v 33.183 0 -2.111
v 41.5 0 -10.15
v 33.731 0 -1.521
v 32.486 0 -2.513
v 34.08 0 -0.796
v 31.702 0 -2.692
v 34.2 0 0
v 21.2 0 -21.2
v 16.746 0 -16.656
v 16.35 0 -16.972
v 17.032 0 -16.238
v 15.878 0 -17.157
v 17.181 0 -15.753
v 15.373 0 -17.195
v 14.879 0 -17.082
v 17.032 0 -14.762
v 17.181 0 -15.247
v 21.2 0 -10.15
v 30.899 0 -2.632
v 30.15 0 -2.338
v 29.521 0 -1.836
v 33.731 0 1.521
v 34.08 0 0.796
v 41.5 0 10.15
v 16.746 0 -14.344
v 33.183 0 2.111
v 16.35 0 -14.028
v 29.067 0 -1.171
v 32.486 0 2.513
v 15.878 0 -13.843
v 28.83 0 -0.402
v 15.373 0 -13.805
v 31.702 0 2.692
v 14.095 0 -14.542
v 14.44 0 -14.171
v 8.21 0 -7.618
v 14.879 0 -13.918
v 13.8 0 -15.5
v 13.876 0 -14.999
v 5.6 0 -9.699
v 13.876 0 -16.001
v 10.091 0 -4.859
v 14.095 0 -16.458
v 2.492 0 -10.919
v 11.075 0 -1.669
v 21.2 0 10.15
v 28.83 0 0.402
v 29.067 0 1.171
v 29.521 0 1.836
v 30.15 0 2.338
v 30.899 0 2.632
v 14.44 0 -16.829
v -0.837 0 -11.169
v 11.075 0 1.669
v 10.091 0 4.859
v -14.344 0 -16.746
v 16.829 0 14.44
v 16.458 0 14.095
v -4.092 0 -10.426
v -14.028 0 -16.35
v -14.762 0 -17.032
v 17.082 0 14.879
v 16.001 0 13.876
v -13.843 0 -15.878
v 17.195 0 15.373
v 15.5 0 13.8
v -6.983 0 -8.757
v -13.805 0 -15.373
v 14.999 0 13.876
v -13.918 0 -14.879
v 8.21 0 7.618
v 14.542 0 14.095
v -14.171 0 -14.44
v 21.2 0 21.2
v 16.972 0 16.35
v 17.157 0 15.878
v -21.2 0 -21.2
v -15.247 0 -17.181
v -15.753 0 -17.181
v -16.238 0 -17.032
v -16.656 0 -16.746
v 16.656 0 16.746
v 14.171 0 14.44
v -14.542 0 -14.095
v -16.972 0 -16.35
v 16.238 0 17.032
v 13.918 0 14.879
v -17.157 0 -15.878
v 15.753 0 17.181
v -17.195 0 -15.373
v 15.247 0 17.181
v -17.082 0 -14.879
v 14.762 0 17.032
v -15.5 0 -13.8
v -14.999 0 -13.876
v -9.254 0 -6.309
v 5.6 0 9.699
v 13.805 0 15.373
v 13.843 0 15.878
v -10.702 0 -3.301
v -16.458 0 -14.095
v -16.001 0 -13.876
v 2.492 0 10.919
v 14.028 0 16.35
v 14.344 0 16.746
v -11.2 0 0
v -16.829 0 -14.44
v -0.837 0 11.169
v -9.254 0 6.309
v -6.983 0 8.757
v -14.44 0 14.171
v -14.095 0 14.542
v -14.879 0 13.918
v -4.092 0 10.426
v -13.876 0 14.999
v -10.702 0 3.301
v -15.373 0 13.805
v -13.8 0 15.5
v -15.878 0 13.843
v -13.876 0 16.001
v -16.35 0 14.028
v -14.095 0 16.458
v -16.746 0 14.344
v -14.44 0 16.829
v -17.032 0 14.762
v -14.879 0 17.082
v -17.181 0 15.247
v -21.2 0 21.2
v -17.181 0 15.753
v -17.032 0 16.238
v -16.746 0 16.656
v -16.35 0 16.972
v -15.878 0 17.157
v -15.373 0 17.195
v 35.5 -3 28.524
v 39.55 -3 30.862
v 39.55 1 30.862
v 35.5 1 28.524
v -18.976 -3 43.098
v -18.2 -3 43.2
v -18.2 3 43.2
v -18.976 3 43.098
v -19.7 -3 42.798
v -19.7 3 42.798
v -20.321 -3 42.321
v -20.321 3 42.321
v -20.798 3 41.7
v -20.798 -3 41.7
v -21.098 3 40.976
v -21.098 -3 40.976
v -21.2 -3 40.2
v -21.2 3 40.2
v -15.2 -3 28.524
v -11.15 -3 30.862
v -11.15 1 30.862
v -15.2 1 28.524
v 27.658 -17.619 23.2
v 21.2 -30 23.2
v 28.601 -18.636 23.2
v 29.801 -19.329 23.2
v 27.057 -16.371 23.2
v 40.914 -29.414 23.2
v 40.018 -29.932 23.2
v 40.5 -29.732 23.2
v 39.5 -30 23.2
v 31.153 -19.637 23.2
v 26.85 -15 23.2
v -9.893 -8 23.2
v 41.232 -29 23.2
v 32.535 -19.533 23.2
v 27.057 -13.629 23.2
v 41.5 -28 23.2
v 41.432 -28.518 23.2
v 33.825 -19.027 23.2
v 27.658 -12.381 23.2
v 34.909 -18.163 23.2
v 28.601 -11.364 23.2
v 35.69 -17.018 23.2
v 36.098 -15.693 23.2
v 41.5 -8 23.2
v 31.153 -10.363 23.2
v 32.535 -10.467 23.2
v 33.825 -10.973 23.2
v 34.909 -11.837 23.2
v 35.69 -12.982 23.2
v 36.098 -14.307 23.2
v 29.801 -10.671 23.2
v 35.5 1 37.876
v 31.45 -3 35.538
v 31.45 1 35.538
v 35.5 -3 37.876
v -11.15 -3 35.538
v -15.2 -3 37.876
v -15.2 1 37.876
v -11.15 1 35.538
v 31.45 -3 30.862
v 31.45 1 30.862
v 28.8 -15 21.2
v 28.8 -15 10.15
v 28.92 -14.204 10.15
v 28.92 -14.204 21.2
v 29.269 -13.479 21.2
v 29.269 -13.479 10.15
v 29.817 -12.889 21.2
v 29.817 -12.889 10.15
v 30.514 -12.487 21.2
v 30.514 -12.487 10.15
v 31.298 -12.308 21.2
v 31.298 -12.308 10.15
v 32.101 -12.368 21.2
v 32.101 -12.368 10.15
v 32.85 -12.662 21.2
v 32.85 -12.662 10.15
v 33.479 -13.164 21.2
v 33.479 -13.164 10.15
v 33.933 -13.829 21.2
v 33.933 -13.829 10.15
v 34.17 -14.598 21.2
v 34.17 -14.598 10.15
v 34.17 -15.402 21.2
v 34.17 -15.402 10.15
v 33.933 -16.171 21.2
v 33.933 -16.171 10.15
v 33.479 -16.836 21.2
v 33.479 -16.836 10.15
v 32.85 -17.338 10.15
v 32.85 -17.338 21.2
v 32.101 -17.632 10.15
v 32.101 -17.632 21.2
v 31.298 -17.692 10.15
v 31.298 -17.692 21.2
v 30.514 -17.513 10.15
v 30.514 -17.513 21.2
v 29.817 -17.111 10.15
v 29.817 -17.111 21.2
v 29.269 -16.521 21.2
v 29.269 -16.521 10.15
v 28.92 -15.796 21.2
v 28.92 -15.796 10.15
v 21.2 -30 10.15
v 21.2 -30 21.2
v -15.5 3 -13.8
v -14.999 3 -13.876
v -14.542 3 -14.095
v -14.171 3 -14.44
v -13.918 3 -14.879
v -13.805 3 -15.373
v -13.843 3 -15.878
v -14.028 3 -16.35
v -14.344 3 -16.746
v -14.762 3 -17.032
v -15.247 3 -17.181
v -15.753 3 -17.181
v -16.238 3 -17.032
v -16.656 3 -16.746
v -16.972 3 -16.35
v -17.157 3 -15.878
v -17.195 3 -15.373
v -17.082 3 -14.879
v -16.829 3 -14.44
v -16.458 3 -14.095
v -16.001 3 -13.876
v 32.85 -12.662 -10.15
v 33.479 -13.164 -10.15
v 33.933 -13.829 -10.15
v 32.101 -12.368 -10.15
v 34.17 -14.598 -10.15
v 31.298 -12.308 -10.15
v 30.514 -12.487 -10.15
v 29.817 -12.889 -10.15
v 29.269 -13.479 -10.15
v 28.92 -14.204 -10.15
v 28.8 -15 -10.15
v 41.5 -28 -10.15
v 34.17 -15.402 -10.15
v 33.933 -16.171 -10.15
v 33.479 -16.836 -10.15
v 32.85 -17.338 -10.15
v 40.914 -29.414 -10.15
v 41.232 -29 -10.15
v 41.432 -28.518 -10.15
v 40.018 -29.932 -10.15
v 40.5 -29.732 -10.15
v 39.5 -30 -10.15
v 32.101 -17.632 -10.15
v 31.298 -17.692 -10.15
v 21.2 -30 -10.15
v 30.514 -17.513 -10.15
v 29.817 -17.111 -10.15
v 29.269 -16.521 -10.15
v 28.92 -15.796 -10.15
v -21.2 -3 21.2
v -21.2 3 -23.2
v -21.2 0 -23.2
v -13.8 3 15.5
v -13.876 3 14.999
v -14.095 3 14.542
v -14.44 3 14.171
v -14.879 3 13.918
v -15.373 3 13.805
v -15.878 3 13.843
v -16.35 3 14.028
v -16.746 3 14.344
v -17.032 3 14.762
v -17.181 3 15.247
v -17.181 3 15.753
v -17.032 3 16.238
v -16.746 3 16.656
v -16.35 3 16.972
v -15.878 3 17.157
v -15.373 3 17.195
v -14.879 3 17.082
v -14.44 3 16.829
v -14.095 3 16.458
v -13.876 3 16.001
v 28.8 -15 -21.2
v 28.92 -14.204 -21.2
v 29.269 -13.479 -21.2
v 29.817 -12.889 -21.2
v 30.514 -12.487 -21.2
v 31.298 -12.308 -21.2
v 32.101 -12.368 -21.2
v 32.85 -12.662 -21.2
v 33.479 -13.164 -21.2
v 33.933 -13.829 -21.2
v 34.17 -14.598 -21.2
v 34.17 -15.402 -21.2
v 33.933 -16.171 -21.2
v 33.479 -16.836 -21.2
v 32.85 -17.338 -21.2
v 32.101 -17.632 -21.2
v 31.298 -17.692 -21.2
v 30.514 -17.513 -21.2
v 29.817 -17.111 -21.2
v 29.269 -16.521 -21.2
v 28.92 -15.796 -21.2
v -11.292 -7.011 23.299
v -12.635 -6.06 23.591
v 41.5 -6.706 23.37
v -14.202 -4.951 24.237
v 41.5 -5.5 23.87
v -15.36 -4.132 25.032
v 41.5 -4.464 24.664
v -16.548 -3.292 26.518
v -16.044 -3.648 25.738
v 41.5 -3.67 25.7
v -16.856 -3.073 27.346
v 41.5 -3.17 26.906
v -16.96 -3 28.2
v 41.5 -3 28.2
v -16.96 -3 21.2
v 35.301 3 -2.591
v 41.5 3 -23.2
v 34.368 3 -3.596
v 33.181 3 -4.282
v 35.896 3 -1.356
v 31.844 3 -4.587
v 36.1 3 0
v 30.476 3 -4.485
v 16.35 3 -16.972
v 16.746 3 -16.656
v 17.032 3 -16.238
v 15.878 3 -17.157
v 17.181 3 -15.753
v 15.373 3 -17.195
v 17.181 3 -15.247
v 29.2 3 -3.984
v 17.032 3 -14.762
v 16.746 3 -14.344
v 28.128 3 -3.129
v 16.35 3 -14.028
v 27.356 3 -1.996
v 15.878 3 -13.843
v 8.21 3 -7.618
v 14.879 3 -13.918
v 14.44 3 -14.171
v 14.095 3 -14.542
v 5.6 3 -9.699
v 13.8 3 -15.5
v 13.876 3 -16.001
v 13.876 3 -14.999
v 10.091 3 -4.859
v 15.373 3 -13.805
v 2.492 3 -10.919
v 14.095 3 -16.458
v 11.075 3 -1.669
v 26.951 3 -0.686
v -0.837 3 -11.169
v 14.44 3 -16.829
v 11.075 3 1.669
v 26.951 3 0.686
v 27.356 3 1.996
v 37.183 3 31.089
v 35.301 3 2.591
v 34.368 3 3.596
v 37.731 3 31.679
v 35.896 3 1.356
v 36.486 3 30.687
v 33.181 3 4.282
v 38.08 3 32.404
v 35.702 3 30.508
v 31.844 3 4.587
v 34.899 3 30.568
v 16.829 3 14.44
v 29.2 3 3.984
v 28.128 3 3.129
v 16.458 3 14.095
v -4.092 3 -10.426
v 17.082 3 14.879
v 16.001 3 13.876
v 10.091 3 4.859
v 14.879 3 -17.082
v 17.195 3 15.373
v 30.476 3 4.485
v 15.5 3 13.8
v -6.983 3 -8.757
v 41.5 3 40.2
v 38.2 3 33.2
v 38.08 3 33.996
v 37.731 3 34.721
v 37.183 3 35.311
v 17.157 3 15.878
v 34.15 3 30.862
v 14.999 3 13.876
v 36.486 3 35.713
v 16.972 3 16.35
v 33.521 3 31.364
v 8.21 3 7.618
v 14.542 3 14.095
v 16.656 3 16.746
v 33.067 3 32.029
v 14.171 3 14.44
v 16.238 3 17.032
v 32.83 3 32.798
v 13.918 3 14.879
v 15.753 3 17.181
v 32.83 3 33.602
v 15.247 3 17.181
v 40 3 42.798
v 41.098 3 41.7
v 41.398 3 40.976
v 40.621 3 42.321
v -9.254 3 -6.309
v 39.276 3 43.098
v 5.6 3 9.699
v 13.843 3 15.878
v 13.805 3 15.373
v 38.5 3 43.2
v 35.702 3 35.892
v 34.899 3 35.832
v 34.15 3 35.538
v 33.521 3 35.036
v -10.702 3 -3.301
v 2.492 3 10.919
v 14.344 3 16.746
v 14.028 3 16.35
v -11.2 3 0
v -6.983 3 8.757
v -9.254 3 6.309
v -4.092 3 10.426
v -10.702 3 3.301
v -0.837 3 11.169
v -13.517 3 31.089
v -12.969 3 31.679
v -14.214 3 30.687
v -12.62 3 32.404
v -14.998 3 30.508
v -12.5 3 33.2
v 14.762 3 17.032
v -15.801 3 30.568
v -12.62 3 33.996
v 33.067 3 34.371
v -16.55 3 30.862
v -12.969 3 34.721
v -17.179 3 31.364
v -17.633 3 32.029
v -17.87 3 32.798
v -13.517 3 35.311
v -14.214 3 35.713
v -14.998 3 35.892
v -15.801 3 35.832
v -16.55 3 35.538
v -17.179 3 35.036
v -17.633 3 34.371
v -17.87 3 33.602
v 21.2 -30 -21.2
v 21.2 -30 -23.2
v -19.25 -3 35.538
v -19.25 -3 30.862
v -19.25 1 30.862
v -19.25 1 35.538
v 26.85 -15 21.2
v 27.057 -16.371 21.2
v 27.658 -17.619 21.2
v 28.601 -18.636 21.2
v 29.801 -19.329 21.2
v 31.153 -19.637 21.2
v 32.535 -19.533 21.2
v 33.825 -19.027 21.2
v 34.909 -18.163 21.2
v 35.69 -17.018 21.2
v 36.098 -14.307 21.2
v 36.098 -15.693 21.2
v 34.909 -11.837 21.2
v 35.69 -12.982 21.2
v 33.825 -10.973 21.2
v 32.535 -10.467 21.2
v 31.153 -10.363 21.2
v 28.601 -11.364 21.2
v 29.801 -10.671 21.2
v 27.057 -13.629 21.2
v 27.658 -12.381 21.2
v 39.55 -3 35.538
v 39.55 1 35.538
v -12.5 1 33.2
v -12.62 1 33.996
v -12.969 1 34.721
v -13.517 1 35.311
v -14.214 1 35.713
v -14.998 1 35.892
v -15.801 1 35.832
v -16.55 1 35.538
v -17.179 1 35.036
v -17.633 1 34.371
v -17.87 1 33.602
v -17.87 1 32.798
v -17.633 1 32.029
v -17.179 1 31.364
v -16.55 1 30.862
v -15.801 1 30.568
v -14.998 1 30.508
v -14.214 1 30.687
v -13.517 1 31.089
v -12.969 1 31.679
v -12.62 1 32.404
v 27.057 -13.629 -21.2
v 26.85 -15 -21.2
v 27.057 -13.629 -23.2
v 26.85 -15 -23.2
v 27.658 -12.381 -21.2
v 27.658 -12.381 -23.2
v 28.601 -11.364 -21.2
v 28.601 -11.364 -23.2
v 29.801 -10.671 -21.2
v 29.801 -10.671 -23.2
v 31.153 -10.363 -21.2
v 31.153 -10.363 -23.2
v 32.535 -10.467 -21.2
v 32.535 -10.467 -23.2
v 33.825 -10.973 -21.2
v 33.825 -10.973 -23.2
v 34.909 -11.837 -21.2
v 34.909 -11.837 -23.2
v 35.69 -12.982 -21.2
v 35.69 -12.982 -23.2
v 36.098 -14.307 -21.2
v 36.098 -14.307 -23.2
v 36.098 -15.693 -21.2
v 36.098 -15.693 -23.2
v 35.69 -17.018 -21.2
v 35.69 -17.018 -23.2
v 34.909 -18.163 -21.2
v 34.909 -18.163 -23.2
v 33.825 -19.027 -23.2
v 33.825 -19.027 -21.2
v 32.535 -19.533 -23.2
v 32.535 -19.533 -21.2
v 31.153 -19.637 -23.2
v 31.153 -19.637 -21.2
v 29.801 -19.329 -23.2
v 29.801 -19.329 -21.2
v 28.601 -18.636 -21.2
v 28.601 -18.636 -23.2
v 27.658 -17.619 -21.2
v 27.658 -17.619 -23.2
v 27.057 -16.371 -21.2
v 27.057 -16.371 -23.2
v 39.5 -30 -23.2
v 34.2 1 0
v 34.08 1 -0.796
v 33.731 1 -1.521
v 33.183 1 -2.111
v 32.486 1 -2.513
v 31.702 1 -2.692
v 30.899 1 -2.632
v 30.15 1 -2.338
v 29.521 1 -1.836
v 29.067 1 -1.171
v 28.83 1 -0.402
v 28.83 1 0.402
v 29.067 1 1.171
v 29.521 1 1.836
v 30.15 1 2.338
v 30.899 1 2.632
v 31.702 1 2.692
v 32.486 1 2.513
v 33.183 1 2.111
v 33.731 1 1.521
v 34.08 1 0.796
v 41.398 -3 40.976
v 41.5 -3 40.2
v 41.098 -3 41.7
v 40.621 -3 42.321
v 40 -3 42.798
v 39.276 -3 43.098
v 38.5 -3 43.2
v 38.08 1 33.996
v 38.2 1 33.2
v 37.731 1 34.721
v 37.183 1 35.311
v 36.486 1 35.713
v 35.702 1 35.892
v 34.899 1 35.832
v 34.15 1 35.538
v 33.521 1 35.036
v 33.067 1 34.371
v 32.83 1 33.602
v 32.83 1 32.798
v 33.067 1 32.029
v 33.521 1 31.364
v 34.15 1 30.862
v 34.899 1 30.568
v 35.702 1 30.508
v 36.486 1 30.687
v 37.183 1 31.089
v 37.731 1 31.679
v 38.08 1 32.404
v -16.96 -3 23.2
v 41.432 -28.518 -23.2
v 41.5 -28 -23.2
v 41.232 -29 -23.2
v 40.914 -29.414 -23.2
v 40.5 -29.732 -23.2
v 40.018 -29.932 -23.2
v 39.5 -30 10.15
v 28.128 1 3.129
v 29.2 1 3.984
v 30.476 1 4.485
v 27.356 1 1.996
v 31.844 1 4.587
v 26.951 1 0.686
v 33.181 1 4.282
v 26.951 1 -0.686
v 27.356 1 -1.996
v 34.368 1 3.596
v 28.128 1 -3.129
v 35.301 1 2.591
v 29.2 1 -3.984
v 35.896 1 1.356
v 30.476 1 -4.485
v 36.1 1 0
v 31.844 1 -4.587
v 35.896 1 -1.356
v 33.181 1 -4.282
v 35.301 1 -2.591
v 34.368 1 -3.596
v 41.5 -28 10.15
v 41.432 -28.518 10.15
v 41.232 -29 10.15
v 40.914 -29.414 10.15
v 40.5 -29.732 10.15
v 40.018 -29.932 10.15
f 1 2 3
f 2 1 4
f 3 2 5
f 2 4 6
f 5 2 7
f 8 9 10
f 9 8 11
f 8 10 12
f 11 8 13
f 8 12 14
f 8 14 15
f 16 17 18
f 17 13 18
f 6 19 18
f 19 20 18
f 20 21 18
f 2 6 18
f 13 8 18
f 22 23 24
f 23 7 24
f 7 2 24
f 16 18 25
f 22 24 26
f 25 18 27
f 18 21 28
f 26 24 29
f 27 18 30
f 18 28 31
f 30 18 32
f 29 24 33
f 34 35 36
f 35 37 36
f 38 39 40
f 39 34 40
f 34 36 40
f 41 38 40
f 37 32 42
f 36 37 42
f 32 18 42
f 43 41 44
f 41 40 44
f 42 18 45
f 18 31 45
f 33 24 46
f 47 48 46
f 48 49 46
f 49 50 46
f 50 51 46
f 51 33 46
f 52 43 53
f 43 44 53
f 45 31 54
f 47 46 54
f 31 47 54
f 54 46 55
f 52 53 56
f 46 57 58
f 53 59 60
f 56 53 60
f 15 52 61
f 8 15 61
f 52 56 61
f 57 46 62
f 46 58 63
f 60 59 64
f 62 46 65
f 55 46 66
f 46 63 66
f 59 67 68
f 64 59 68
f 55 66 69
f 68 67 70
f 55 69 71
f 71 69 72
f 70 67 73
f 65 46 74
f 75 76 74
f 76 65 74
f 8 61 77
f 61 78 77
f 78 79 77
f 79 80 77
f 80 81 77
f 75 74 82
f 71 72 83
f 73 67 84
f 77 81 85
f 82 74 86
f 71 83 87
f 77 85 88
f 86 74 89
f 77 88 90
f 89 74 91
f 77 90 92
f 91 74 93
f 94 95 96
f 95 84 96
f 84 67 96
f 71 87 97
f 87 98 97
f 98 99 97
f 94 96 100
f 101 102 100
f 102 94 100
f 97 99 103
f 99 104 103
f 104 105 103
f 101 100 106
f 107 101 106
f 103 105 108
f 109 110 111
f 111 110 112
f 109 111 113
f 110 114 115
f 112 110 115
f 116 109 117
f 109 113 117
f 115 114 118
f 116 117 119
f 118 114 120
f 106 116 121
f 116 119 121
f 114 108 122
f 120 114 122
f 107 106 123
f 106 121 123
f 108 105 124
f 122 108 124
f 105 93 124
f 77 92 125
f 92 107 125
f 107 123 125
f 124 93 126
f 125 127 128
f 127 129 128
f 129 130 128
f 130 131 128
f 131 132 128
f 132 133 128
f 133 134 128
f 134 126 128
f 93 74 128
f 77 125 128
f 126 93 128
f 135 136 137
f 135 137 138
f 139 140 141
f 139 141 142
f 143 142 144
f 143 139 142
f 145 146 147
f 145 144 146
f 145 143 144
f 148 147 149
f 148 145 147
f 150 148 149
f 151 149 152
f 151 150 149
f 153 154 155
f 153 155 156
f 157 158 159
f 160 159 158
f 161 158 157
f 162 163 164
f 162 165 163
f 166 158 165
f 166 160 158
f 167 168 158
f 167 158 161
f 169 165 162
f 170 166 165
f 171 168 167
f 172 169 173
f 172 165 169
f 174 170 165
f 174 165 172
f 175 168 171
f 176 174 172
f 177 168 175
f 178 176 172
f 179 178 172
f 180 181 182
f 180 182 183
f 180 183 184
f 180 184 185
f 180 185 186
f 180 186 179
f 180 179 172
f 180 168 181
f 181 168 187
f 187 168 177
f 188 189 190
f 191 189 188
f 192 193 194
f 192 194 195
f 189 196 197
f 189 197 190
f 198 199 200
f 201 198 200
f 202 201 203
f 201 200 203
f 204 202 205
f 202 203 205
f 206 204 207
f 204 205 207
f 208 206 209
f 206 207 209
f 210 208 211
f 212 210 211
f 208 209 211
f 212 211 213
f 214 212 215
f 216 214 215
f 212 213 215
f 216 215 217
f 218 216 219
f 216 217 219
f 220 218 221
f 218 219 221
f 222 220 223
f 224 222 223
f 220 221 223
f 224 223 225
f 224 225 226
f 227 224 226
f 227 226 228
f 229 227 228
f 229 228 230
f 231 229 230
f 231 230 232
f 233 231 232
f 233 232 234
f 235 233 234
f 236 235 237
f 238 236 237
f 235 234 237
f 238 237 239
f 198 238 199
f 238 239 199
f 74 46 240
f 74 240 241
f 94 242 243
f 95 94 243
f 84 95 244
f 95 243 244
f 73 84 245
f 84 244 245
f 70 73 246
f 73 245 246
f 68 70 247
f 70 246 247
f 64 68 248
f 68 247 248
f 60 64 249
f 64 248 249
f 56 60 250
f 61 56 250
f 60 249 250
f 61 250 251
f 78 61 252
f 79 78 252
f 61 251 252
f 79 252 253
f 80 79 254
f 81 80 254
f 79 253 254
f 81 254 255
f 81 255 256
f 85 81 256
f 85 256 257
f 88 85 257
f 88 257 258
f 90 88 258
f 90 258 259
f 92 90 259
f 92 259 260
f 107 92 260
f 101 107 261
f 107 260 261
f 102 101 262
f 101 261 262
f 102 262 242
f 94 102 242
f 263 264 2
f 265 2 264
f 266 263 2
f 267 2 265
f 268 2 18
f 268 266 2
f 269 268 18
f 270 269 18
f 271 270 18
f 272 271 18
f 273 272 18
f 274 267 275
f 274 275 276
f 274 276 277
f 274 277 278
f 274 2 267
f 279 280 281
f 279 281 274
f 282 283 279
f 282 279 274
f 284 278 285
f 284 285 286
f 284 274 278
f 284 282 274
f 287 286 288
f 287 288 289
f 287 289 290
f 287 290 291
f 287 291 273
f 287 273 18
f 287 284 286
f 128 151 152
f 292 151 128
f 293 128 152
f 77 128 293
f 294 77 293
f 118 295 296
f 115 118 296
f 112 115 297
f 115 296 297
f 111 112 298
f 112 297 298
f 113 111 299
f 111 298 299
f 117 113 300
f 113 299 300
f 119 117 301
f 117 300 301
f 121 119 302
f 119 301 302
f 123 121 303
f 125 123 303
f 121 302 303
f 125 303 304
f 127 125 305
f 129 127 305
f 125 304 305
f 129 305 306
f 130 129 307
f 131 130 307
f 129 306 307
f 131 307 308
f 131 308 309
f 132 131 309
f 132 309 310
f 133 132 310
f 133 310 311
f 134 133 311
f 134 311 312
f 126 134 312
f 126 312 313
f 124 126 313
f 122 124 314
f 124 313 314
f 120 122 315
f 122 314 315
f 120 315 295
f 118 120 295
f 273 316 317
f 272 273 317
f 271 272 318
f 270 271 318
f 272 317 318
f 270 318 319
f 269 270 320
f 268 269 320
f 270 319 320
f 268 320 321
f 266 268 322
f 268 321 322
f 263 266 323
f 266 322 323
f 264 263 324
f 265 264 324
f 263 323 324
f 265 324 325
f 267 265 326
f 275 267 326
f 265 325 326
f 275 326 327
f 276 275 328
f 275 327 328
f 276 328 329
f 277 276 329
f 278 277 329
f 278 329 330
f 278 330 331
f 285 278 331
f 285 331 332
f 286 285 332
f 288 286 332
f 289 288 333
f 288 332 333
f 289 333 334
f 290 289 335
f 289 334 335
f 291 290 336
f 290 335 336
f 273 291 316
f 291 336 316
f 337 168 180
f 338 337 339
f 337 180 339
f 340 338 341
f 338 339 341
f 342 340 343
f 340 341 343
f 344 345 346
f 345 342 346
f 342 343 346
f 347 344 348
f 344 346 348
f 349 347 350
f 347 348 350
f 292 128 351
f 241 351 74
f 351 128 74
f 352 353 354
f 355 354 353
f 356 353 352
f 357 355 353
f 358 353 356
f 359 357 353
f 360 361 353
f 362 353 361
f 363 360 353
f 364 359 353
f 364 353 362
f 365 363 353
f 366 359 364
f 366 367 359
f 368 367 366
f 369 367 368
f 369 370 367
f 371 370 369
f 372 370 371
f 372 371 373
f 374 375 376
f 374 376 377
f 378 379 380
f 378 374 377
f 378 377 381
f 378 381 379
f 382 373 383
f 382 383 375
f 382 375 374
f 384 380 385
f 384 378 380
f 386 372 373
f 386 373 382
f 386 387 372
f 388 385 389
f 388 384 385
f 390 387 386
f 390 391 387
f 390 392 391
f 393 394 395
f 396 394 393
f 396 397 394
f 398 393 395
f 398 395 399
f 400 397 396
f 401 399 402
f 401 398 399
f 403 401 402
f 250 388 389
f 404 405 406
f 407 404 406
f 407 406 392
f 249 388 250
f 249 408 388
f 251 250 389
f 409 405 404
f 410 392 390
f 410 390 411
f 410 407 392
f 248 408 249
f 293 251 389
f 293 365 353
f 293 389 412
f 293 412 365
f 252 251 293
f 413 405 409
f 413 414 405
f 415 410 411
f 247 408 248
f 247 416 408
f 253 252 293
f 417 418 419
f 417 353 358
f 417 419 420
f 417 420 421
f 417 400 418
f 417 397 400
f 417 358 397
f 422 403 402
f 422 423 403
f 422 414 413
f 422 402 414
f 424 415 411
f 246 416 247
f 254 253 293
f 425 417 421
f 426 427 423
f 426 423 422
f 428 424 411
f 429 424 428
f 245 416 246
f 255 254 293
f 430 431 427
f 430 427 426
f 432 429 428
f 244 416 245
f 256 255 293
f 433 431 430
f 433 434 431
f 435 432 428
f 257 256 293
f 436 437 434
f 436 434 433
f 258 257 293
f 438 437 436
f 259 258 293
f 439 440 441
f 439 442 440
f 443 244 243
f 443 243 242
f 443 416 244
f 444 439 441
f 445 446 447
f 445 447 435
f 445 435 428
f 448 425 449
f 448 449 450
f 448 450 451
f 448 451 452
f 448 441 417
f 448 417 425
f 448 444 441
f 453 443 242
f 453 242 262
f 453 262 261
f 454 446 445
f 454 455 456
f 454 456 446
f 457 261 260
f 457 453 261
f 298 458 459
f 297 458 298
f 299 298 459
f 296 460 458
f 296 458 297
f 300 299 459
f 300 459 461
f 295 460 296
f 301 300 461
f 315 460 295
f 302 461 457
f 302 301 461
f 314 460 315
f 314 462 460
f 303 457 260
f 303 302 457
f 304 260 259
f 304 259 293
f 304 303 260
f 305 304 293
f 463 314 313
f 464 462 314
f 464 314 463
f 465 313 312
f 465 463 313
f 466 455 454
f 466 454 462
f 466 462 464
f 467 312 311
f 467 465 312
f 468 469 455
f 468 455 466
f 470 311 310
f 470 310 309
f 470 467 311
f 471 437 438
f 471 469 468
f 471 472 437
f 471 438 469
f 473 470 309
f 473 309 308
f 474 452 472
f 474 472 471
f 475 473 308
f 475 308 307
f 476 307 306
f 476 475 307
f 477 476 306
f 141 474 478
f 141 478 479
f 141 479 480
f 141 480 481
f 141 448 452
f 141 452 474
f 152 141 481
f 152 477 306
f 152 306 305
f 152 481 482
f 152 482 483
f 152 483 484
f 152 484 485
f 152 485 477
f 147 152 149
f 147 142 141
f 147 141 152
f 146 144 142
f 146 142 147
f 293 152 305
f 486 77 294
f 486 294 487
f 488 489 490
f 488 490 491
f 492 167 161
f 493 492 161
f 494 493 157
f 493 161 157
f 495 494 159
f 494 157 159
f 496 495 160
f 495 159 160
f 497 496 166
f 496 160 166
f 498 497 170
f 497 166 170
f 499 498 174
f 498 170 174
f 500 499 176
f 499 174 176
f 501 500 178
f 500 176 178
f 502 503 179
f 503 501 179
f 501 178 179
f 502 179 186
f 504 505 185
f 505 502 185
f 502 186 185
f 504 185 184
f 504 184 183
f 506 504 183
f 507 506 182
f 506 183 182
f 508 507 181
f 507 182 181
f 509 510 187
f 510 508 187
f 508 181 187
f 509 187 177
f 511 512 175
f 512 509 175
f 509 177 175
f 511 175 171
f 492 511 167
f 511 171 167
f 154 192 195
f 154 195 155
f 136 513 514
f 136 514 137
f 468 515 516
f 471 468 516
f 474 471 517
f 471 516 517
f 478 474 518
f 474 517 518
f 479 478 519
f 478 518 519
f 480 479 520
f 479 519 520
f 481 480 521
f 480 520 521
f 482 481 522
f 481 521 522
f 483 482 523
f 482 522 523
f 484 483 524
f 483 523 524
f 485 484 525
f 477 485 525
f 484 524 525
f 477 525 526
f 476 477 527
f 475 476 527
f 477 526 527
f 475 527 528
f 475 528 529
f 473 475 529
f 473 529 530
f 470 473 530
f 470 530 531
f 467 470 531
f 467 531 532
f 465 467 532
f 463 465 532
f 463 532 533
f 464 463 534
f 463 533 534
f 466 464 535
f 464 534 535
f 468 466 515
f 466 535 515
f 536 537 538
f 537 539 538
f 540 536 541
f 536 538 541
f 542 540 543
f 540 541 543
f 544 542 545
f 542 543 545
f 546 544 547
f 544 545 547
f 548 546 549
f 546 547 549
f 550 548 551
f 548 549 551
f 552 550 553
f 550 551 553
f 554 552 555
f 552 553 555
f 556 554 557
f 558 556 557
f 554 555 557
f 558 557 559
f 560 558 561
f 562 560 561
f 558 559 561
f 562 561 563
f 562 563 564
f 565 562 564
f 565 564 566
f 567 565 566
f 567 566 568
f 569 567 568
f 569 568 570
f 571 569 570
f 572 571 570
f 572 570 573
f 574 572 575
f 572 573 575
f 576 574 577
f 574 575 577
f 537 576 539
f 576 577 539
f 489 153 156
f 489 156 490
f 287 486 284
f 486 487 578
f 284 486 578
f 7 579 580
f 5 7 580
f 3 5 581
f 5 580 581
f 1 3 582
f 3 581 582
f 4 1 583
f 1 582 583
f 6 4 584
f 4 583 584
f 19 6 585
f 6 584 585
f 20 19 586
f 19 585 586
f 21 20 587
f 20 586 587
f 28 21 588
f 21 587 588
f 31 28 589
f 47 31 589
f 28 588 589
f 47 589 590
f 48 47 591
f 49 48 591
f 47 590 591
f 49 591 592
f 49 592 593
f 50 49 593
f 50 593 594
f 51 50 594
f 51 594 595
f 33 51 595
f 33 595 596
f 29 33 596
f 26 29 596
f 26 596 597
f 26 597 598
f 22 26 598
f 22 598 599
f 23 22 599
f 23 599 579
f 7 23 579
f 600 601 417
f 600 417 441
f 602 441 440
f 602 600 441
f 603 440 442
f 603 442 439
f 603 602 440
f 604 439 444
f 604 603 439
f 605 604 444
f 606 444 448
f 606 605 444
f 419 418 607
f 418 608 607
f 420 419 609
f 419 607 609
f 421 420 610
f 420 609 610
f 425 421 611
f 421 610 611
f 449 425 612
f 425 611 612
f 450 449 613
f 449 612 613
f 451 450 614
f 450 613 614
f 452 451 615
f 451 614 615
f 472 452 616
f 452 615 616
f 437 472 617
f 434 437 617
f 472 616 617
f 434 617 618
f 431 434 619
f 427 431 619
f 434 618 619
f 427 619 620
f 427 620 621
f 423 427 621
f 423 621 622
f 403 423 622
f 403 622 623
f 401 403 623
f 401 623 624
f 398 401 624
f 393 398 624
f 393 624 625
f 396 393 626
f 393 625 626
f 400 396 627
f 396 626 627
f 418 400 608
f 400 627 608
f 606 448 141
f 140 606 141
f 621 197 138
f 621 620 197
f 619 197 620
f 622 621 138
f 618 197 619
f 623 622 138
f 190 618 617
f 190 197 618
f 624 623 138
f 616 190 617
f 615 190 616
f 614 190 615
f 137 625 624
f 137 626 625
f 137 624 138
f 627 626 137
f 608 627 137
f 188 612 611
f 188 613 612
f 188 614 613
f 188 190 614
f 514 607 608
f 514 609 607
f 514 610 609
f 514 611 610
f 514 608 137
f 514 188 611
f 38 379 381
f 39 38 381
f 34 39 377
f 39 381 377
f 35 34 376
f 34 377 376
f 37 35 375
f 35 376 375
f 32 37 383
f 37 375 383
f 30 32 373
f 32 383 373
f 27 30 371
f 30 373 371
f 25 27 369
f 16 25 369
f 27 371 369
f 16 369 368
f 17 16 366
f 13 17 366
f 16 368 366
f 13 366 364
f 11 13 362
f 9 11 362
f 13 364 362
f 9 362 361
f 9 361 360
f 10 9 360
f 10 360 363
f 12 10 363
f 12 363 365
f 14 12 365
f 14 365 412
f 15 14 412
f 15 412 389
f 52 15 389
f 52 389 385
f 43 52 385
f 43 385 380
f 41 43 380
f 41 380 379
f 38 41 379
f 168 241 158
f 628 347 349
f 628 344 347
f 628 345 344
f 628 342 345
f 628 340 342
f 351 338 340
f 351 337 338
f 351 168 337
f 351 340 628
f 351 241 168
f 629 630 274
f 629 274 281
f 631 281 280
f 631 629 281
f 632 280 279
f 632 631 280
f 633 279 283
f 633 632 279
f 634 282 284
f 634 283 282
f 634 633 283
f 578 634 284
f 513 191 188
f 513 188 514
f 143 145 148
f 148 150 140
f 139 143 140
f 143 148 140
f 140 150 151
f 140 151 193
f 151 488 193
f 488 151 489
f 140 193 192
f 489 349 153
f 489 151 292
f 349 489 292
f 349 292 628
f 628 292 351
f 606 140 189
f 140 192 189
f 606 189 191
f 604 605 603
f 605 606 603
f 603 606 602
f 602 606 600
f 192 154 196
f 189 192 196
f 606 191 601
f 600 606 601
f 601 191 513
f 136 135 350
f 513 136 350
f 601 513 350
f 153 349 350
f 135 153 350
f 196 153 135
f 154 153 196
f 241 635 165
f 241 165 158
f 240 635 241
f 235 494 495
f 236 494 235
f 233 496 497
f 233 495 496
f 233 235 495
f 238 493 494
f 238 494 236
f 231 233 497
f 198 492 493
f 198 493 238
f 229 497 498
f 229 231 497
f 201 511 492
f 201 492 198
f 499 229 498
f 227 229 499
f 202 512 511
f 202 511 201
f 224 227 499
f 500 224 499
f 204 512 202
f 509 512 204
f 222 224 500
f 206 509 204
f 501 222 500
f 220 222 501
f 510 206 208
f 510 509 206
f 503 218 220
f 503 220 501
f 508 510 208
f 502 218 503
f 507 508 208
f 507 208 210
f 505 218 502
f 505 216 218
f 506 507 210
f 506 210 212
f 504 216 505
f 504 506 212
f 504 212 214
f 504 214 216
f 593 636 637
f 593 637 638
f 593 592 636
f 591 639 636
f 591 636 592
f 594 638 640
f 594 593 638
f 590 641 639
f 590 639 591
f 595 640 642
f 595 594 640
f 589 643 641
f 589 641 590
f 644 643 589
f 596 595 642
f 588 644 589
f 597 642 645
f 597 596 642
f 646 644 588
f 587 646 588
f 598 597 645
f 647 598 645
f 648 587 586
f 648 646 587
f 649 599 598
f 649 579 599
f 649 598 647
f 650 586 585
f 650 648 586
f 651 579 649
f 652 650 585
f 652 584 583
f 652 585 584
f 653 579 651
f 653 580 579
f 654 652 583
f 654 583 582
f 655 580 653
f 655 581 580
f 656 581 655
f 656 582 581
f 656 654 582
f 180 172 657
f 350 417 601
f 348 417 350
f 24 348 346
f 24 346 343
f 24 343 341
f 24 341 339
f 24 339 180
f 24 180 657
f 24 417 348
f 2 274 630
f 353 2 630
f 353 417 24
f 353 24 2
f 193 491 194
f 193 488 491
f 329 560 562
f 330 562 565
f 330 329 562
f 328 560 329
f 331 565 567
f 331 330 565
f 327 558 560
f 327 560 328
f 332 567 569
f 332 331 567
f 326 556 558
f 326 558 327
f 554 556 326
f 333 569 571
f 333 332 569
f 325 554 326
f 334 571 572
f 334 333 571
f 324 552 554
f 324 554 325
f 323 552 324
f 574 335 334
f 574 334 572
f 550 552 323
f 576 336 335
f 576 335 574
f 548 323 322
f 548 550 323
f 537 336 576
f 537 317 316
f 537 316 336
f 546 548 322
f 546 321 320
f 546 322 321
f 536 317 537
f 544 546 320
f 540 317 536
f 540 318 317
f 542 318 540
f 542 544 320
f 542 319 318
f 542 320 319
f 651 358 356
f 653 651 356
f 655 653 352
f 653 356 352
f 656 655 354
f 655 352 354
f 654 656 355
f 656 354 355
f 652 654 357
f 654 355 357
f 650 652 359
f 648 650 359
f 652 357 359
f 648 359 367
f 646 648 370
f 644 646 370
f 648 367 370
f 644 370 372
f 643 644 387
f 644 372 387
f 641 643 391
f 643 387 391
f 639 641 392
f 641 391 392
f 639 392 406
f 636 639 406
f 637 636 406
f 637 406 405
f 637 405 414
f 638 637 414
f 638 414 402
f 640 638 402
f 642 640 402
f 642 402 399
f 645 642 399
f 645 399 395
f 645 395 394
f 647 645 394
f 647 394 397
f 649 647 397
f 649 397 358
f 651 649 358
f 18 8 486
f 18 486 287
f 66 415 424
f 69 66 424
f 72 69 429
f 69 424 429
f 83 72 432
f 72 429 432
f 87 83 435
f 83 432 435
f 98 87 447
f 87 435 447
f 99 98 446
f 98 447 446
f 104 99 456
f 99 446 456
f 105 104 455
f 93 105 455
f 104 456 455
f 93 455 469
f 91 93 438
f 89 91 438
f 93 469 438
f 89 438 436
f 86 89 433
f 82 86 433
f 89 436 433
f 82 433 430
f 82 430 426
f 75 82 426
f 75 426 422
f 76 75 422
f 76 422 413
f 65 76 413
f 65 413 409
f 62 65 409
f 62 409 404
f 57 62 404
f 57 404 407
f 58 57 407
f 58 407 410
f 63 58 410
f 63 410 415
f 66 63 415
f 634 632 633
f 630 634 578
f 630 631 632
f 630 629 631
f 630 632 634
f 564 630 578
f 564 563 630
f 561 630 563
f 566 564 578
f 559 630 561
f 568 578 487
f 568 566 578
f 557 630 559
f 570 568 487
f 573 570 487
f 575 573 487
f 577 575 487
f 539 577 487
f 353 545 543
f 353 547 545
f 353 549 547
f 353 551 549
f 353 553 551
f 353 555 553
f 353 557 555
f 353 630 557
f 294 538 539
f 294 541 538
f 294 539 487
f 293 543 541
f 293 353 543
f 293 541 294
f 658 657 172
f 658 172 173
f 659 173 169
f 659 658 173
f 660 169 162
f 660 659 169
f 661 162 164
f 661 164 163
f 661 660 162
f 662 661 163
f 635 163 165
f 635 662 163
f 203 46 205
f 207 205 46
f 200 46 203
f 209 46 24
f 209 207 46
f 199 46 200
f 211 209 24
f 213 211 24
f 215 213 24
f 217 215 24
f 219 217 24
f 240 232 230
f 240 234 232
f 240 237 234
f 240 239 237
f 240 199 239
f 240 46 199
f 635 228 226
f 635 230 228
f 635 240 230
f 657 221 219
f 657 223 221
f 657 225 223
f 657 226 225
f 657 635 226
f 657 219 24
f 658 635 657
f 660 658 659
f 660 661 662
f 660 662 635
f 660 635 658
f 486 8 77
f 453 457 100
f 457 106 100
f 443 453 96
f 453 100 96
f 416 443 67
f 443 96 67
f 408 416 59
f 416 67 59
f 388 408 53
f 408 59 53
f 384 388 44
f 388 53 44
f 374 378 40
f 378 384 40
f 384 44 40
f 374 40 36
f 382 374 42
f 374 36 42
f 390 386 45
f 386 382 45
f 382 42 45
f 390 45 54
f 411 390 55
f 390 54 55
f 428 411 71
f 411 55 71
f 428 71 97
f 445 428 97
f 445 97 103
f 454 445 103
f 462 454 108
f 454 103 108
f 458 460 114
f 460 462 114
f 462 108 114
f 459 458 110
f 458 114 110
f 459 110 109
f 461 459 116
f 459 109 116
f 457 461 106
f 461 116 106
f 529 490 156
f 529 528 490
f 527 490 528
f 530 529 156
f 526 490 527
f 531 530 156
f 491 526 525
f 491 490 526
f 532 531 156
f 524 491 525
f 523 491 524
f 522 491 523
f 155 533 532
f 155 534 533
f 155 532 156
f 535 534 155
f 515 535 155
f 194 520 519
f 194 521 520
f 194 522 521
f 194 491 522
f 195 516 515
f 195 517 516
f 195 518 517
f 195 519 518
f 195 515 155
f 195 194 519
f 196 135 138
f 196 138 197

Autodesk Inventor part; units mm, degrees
ref_plane "YZ Plane" through (0, 0, 0) normal (1, 0, 0) x (0, 1, 0)
ref_plane "XZ Plane" through (0, 0, 0) normal (0, 1, 0) x (-1, 0, 0)
ref_plane "XY Plane" through (0, 0, 0) normal (0, 0, 1) x (1, 0, 0)
sketch "Boceto1" plane through (0, 0, 0) normal (0, 1, 0) x (-1, 0, 0)
  line L0 (-21.2, 21.2) -> (21.2, 21.2)
  line L1 (21.2, 21.2) -> (21.2, -21.2)
  line L2 (21.2, -21.2) -> (-21.2, -21.2)
  line L3 (-21.2, -21.2) -> (-21.2, 21.2)
  line L4 (-21.2, 21.2) -> (21.2, -21.2) construction
  line L5 (21.2, 21.2) -> (-21.2, -21.2) construction
  circle A0 centre (0, 0) radius 11.2
  point P0 (0, 0)
  dimension "d0" = 42.4
  dimension "d1" = 42.4
  dimension "d2" = 22.4
extrude "Extrusión1" add sketch "Boceto1" along normal blind 3
sketch "Boceto2" plane through (0, 3, 0) normal (0, 1, 0) x (1, 0, 0)
  circle A0 centre (-15.5, -15.5) radius 1.7
  line L0 (15.5, -15.5) -> (-15.5, -15.5)
  line L1 (-15.5, -15.5) -> (-15.5, 15.5)
  line L2 (-15.5, 15.5) -> (15.5, 15.5)
  line L3 (15.5, 15.5) -> (15.5, -15.5)
  line L4 (15.5, -15.5) -> (-15.5, 15.5) construction
  line L5 (-15.5, -15.5) -> (15.5, 15.5) construction
  point P0 (0, 0)
  dimension "d5" = 31
  dimension "d6" = 31
  dimension "d7" = 3.4
extrude "Extrusión2" cut sketch "Boceto2" against normal through all contours L0 L1 A0 | A0 L1 L0
pattern_circular "Patrón circular1" count 4 over 360 about axis through (0, 0, 0) along (0, 1, 0) of "Extrusión2"
sketch "Boceto13" plane through (0, 3, 0) normal (0, 1, 0) x (1, 0, 0)
  line L0 (-21.2, -21.2) -> (21.2, -21.2) projected
  line L1 (21.2, -21.2) -> (41.5, -21.2)
  line L2 (41.5, -21.2) -> (41.5, 21.2)
  line L3 (41.5, 21.2) -> (21.2, 21.2)
  line L4 (21.2, 21.2) -> (21.2, -21.2)
  line L5 (21.2, 21.2) -> (-21.2, 21.2) projected
  line L6 (41.5, -10.15) -> (21.2, -10.15)
  line L7 (21.2, -10.15) -> (21.2, 10.15)
  line L8 (21.2, 10.15) -> (41.5, 10.15)
  line L9 (41.5, 10.15) -> (41.5, -10.15)
  line L10 (41.5, -10.15) -> (21.2, 10.15) construction
  line L11 (21.2, -10.15) -> (41.5, 10.15) construction
  circle A0 centre (31.5, 0) radius 2.7
  point P0 (0, 0)
  point P1 (31.35, 0)
  dimension "d43" = 20.3
  dimension "d44" = 20.3
  dimension "d45" = 20.3
  dimension "d61" = 5.4
  dimension "d62" = 10
extrude "Extrusión8" add sketch "Boceto13" against normal blind 33
sketch "Boceto14" plane through (0, -30, 0) normal (0, -1, 0) x (1, 0, 0)
  line L0 (21.2, 21.2) -> (21.2, -21.2) projected
  line L1 (41.5, -10.15) -> (21.2, -10.15)
  line L2 (21.2, -10.15) -> (21.2, 10.15)
  line L3 (21.2, 10.15) -> (41.5, 10.15)
  line L4 (41.5, 10.15) -> (41.5, -10.15)
  line L5 (41.5, -10.15) -> (21.2, 10.15) construction
  line L6 (21.2, -10.15) -> (41.5, 10.15) construction
  point P0 (0, 0)
  point P1 (31.35, 0)
  dimension "d49" = 20.3
extrude "Extrusión9" cut sketch "Boceto14" against normal up to surface (30 mm away)
sketch "Boceto15" plane through (-21.2, 0, -21.2) normal (0, 0, -1) x (-1, 0, 0)
  line L0 (-42.4, 0) -> (0, 0) projected
  line L1 (0, 0) -> (0, 3) projected
  line L2 (-62.7, 3) -> (0, 3) projected
  line L3 (-62.7, 3) -> (-62.7, -30) projected
  line L4 (-42.4, -30) -> (-62.7, -30) projected
  line L5 (-42.4, 0) -> (-42.4, -30) projected
  line L6 (0, 0) -> (0, 3) projected
  line L7 (-42.4, -30) -> (-62.7, -30) projected
  line L8 (0, 0) -> (-42.4, -30)
  point P0 (-21.2, 0)
extrude "Extrusión10" add sketch "Boceto15" along normal blind 2
mirror "Simetría1" about plane through (0, 0, 0) normal (0, 0, 1) of "Extrusión10"
sketch "Boceto16" plane through (-21.2, 0, -23.2) normal (0, 0, -1) x (-1, 0, 0)
  circle A0 centre (-52.7, -15) radius 2.7
  line L0 (-62.7, 3) -> (-62.7, -30) projected
  line L1 (-62.7, -30) -> (-42.4, -30) projected
  point P0 (-21.2, 0)
  dimension "d54" = 10
  dimension "d55" = 5.4
  dimension "d57" = 15
extrude "Extrusión11" cut sketch "Boceto16" against normal through all
fillet "Empalme1" radius 2 2 edges at (41.5, -30, -16.675) (41.5, -30, 16.675)
sketch "Boceto17" plane through (-21.2, 0, -23.2) normal (0, 0, -1) x (-1, 0, 0)
  circle A0 centre (-52.7, -15) radius 2.7 projected
  circle A1 centre (-52.7, -15) radius 4.65
  point P0 (-21.2, 0)
  dimension "d63" = 9.3
extrude "Extrusión12" cut sketch "Boceto17" against normal blind 2 contours A0 | A1
sketch "Boceto18" plane through (0, 3, 0) normal (0, 1, 0) x (1, 0, 0)
  circle A0 centre (31.5, 0) radius 2.7 projected
  circle A1 centre (31.5, 0) radius 4.6
  point P0 (0, 0)
  dimension "d66" = 9.2
extrude "Extrusión13" cut sketch "Boceto18" against normal blind 2 contours A0 | A1
mirror "Simetría2" about plane through (0, 0, 0) normal (0, 0, 1) of "Extrusión12"
sketch "Boceto19" plane through (0, 3, 0) normal (0, 1, 0) x (1, 0, 0)
  line L0 (21.2, -21.2) -> (-21.2, -21.2) projected
  line L1 (-21.2, 21.2) -> (-21.2, -21.2) projected
  line L2 (-21.2, -21.2) -> (41.5, -21.2)
  line L3 (41.5, -21.2) -> (41.5, -43.2)
  line L4 (41.5, -43.2) -> (-21.2, -43.2)
  line L5 (-21.2, -43.2) -> (-21.2, -21.2)
  line L6 (-21.2, -23.2) -> (41.5, -23.2) projected
  line L7 (41.5, -23.2) -> (41.5, 23.2) projected
  point P0 (0, 0)
  dimension "d69" = 20
extrude "Extrusión14" add sketch "Boceto19" against normal blind 6
sketch "Boceto20" plane through (0, -3, 0) normal (0, -1, 0) x (1, 0, 0)
  circle A0 centre (-15.2, 33.2) radius 2.7
  circle A1 centre (35.5, 33.2) radius 2.7
  line L0 (-21.2, 43.2) -> (-21.2, 21.2) projected
  line L1 (41.5, 23.2) -> (41.5, 43.2) projected
  line L2 (41.5, 43.2) -> (-21.2, 43.2) projected
  point P0 (0, 0)
  dimension "d72" = 5.4
  dimension "d73" = 6
  dimension "d74" = 6
  dimension "d75" = 10
  dimension "d76" = 10
extrude "Extrusión15" cut sketch "Boceto20" against normal through all
sketch "Boceto21" plane through (0, -3, 0) normal (0, -1, 0) x (1, 0, 0)
  circle A0 centre (-15.2, 33.2) radius 2.7 projected
  circle A1 centre (-15.2, 33.2) radius 4.05
  circle A2 centre (35.5, 33.2) radius 2.7 projected
  circle A3 centre (35.5, 33.2) radius 4.05
  line L0 (35.5, 37.8765) -> (39.55, 35.5383)
  line L1 (39.55, 35.5383) -> (39.55, 30.8617)
  line L2 (39.55, 30.8617) -> (35.5, 28.5235)
  line L3 (35.5, 28.5235) -> (31.45, 30.8617)
  line L4 (31.45, 30.8617) -> (31.45, 35.5383)
  line L5 (31.45, 35.5383) -> (35.5, 37.8765)
  line L6 (-15.2, 37.8765) -> (-11.15, 35.5383)
  line L7 (-11.15, 35.5383) -> (-11.15, 30.8617)
  line L8 (-11.15, 30.8617) -> (-15.2, 28.5235)
  line L9 (-15.2, 28.5235) -> (-19.25, 30.8617)
  line L10 (-19.25, 30.8617) -> (-19.25, 35.5383)
  line L11 (-19.25, 35.5383) -> (-15.2, 37.8765)
  point P0 (0, 0)
  dimension "d79" = 8.1
extrude "Extrusión16" cut sketch "Boceto21" against normal blind 4 contours A0 | A1 | L7 L8 A1 | A1 L6 L7 | A1 L11 L6 | L8 L9 A1 | A1 L10 L11 | L9 L10 A1 | A2 | A3 | L1 L2 A3 | A3 L0 L1 | A3 L5 L0 | L2 L3 A3 | A3 L4 L5 | L3 L4 A3
fillet "Empalme2" radius 3 2 edges at (-21.2, 0, 43.2) (41.5, 0, 43.2)
fillet "Empalme3" radius 5 1 edges at (12.27, -3, 23.2)
sketch "Boceto7" plane through (21.2, 0, -21.2) normal (0, 0, -1) x (-1, 0, 0)
  line L0 (42.4, 0) -> (42.4, 3) projected
  line L1 (42.4, 3) -> (-20.3, 3)
  line L2 (-20.3, 3) -> (-20.3, -27)
  line L3 (-20.3, -27) -> (42.4, -27)
  line L4 (42.4, -27) -> (42.4, 3)
  line L5 (0, 0) -> (0, 3) projected
  point P0 (21.2, 0)
  point P1 (35.6, 0)
  dimension "d23" = 20.3
  dimension "d24" = 30
sketch "Boceto8" plane through (0, 3, 0) normal (0, 1, 0) x (1, 0, 0)
  line L0 (17.8, 17.8) -> (-17.8, 17.8) projected
  line L1 (17.8, -17.8) -> (16.8, -17.8)
  line L2 (16.8, -17.8) -> (16.8, 17.8)
  line L3 (16.8, 17.8) -> (17.8, 17.8)
  line L4 (17.8, 17.8) -> (17.8, -17.8)
  point P0 (0, 0)
  dimension "d27" = 1
sketch "Boceto9" plane through (17.8, 0, -21.8) normal (0, 0, -1) x (-1, 0, 0)
  circle A0 centre (-10.3, -4.5) radius 2.7
  circle A1 centre (-10.3, -19.5) radius 2.7
  line L0 (-20.3, 3) -> (-20.3, -27) projected
  line L1 (35.6, 3) -> (-20.3, 3) projected
  line L2 (-20.3, -27) -> (35.6, -27) projected
  point P0 (17.8, 0)
  dimension "d30" = 5.4
  dimension "d31" = 10
  dimension "d32" = 7.5
  dimension "d33" = 7.5
  dimension "d41" = 80
  dimension "d42" = 20.3
sketch "Boceto10" plane through (17.8, 0, -17.8) normal (0, 0, 1) x (1, 0, 0)
  line L0 (20.3, 3) -> (20.3, -27) projected
  line L1 (-1, 3) -> (20.3, 3) projected
  line L2 (20.3, -27) -> (0.3, -27)
  line L3 (0.3, -27) -> (0.3, 3)
  line L4 (0.3, 3) -> (20.3, 3)
  line L5 (20.3, 3) -> (20.3, -27)
  circle A0 centre (10.3, -4.5) radius 2.7 projected
  circle A1 centre (10.3, -19.5) radius 2.7 projected
  line L6 (-1, 0) -> (-35.6, 0) projected
  line L7 (-35.6, -27) -> (-35.6, 0) projected
  line L8 (20.3, -27) -> (-35.6, -27) projected
  line L9 (20.3, 3) -> (20.3, -27) projected
  line L10 (-1, 3) -> (20.3, 3) projected
  line L11 (-1, 3) -> (-1, 0) projected
  point P0 (-17.8, 0)
  dimension "d36" = 20
sketch "Boceto3" plane through (-21.2, 0, 21.2) normal (0, 0, 1) x (1, 0, 0)
  line L0 (0, 0) -> (0, 3) projected
  line L1 (0, 3) -> (62.7, 3)
  line L2 (62.7, 3) -> (62.7, -30)
  line L3 (62.7, -30) -> (0, -30)
  line L4 (0, -30) -> (0, 3)
  line L5 (42.4, 0) -> (42.4, 3) projected
  line L6 (0, 0) -> (42.4, 0) projected
  point P0 (21.2, 0)
  dimension "d13" = 20.3
  dimension "d14" = 30
  dimension "d17" = 5.4
  dimension "d18" = 10
  dimension "d19" = 7.5
  dimension "d20" = 7.5
  dimension "d21" = 20.3
  dimension "d22" = 20.3
properties part number "NEMA14 support"
